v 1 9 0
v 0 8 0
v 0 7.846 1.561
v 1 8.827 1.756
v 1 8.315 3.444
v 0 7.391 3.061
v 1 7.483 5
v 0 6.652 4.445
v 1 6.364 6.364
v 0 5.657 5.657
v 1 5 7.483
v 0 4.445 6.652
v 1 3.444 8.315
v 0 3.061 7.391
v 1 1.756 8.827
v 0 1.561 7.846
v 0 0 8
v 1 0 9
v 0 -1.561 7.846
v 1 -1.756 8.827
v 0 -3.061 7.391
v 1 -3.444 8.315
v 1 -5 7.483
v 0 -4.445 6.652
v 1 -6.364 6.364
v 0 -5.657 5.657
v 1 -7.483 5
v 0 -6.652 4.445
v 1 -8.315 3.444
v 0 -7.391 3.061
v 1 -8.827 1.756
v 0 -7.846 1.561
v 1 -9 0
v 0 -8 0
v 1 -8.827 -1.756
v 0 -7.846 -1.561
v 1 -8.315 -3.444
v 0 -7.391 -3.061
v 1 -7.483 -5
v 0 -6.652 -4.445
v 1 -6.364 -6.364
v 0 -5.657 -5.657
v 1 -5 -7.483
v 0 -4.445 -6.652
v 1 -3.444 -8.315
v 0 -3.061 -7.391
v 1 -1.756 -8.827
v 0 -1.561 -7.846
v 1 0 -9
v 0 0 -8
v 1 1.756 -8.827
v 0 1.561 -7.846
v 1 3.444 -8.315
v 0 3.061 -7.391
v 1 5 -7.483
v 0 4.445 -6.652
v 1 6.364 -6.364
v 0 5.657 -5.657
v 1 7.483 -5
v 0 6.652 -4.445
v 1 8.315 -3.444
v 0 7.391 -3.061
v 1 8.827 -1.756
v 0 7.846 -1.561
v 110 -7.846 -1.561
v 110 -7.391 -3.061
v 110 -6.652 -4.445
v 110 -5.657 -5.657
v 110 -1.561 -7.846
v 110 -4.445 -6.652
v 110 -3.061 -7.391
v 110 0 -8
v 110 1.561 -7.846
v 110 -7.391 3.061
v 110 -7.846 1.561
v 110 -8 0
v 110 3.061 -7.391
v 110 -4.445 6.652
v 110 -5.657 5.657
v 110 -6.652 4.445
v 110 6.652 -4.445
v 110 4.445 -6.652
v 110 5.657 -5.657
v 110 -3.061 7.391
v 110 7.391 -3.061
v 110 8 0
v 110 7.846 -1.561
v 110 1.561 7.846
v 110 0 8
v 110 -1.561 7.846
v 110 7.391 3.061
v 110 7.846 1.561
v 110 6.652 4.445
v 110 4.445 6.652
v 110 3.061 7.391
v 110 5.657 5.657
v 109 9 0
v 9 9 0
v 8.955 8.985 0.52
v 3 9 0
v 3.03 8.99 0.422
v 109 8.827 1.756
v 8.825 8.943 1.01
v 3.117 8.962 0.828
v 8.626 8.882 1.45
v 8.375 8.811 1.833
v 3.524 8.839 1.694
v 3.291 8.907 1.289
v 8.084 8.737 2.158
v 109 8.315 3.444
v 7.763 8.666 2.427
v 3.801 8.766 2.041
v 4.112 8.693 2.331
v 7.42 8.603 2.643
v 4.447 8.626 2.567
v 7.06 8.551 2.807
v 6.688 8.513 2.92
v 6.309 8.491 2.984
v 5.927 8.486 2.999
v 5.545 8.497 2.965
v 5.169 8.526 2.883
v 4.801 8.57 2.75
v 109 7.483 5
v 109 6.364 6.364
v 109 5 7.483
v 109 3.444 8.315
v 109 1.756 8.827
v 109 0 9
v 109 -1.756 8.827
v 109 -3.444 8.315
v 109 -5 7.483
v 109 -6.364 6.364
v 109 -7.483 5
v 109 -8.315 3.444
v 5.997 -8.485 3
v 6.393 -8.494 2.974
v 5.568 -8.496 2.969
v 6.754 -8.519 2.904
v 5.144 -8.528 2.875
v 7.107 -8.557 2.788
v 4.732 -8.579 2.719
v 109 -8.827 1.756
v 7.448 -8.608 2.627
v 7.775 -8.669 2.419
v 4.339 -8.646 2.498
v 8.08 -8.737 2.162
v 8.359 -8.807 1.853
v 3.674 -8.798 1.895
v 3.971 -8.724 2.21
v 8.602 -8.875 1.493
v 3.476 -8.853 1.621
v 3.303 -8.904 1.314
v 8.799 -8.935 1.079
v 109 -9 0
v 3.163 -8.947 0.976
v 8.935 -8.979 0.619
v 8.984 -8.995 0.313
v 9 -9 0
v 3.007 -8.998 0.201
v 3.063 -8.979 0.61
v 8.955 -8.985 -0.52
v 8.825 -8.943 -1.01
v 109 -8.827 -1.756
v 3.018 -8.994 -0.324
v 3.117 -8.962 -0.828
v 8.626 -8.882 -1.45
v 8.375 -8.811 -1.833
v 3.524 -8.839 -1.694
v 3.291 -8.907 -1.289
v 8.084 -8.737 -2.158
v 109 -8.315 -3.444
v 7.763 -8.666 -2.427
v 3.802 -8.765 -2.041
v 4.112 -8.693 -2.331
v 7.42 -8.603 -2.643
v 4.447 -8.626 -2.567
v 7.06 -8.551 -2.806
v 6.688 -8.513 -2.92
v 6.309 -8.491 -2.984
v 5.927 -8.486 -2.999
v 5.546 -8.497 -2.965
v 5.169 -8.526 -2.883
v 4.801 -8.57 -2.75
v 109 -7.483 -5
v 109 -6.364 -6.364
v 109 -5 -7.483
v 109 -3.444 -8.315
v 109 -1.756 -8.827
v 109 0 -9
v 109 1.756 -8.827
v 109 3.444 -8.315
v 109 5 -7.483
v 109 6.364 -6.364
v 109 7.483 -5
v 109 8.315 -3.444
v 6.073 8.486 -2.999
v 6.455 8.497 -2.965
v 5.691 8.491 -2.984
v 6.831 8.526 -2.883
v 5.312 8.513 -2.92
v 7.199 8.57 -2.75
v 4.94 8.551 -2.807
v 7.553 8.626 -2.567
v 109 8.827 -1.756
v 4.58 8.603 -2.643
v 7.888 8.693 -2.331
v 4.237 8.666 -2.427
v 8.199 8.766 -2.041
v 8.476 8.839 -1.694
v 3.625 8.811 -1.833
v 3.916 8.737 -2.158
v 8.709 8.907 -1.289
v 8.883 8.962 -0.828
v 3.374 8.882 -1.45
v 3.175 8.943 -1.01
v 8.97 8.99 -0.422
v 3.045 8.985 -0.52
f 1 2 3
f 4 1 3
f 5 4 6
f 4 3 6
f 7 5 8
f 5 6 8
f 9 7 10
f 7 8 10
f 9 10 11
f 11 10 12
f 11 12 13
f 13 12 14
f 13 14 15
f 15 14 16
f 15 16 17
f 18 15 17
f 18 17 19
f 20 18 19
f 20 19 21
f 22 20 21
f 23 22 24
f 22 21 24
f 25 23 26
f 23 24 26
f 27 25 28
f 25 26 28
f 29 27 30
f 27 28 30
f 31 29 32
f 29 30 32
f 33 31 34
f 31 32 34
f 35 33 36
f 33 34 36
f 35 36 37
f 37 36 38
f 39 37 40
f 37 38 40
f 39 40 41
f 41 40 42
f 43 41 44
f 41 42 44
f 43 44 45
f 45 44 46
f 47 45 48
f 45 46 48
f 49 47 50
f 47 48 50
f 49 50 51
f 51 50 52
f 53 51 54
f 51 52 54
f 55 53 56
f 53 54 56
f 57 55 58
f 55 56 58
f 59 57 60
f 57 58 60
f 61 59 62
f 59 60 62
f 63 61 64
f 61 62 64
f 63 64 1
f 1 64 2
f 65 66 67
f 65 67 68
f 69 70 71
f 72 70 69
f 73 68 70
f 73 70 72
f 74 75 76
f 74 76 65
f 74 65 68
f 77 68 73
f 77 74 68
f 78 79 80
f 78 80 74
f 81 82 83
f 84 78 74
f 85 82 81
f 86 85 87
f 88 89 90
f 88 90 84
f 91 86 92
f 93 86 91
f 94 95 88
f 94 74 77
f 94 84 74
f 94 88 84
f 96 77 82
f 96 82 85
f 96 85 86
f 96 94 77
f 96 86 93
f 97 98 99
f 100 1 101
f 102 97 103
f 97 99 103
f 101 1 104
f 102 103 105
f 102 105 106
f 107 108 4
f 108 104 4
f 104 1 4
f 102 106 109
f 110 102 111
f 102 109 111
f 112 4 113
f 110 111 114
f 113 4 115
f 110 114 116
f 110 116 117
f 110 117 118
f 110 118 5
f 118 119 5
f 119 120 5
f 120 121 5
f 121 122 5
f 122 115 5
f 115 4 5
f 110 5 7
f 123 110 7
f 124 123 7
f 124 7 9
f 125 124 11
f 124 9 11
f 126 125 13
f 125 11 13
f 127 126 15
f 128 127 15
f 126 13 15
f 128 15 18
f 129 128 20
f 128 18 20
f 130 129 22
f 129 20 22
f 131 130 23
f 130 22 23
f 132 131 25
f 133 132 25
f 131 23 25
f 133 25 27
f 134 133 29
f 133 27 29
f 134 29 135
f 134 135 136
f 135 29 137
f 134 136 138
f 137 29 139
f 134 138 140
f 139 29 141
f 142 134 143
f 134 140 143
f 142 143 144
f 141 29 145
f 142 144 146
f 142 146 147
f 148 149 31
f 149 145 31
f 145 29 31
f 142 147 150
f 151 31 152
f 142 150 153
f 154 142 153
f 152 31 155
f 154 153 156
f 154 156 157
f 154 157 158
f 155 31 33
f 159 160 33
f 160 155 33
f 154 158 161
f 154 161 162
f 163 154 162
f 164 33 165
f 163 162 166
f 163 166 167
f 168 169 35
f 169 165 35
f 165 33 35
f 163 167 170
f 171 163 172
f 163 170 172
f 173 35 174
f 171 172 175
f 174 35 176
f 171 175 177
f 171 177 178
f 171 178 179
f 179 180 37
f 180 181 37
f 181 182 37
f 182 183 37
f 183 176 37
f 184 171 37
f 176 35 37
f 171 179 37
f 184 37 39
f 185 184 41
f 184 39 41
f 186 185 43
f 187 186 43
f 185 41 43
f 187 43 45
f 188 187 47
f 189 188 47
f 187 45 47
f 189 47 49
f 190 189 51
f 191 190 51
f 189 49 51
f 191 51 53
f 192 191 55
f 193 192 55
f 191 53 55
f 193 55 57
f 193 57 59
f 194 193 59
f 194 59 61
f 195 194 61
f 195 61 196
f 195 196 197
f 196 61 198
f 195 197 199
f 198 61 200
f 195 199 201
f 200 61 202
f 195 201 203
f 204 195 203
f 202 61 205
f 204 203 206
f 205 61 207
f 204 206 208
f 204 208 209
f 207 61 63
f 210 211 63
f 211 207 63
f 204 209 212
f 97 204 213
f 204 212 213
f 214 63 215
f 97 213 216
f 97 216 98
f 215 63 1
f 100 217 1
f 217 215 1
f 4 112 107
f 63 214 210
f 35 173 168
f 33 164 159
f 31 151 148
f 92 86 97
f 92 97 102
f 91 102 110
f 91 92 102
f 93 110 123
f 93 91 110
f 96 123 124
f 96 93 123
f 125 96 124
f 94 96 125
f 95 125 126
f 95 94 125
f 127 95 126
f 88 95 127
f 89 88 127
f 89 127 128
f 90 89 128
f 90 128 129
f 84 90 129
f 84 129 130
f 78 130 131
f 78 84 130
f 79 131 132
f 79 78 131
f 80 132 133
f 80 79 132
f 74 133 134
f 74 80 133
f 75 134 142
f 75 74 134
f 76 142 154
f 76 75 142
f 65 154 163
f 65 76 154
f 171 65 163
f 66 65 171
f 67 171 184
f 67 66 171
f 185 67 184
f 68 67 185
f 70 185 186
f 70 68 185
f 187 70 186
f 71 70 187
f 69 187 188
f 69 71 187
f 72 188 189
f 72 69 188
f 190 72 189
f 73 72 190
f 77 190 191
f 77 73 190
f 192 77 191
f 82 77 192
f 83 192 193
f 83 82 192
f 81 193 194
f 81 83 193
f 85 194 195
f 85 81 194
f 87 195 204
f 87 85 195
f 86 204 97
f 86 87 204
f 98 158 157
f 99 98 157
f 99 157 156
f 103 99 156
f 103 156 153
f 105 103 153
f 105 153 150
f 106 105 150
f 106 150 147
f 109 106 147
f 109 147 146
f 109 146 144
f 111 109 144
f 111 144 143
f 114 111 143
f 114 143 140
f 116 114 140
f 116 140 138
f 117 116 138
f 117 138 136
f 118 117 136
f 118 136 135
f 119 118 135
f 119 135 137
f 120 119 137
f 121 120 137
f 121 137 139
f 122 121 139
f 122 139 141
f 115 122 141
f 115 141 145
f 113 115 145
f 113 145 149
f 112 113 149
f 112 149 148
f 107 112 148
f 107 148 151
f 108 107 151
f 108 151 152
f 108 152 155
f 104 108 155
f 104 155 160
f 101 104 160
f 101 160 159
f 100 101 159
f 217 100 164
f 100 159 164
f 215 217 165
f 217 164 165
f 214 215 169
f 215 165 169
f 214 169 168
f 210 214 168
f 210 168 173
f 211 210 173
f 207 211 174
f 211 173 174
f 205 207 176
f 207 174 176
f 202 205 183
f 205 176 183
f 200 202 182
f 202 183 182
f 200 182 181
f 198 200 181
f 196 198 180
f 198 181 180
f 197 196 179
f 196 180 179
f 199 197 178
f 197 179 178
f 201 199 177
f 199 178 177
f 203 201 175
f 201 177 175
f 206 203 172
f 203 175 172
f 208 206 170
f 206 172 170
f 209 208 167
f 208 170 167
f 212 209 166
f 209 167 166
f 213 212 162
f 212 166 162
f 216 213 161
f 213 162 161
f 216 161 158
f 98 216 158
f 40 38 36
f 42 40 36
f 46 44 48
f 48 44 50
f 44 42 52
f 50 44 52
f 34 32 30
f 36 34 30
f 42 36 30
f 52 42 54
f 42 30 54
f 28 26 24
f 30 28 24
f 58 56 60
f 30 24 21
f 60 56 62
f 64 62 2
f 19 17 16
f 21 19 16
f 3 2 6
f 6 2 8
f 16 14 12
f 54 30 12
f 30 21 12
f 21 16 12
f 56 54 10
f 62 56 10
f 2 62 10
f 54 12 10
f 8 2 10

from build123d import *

# Parameters (mm, degrees)
F0_R     = 9
F1_DEPTH = 110
F2_SIZE  = 1
F3_R     = 3
F4_DEPTH = 9


with BuildPart() as f1:
    # F0 (on Right) → F1 (new body)
    with BuildSketch(Plane.YZ):
        Circle(F0_R)
    extrude(amount=F1_DEPTH)

    # F2
    f2_edges = [f1.edges().sort_by_distance(p)[0] for p in [
        (110, -9, 0),
        (0, -9, 0),
    ]]
    chamfer(f2_edges, length=F2_SIZE)

    # F3 (on Front) → F4 (cut, symmetric)
    with BuildSketch(Plane.XZ):
        with Locations((6, 0)):
            Circle(F3_R)
    extrude(amount=F4_DEPTH, both=True, mode=Mode.SUBTRACT)


solid = f1.part
